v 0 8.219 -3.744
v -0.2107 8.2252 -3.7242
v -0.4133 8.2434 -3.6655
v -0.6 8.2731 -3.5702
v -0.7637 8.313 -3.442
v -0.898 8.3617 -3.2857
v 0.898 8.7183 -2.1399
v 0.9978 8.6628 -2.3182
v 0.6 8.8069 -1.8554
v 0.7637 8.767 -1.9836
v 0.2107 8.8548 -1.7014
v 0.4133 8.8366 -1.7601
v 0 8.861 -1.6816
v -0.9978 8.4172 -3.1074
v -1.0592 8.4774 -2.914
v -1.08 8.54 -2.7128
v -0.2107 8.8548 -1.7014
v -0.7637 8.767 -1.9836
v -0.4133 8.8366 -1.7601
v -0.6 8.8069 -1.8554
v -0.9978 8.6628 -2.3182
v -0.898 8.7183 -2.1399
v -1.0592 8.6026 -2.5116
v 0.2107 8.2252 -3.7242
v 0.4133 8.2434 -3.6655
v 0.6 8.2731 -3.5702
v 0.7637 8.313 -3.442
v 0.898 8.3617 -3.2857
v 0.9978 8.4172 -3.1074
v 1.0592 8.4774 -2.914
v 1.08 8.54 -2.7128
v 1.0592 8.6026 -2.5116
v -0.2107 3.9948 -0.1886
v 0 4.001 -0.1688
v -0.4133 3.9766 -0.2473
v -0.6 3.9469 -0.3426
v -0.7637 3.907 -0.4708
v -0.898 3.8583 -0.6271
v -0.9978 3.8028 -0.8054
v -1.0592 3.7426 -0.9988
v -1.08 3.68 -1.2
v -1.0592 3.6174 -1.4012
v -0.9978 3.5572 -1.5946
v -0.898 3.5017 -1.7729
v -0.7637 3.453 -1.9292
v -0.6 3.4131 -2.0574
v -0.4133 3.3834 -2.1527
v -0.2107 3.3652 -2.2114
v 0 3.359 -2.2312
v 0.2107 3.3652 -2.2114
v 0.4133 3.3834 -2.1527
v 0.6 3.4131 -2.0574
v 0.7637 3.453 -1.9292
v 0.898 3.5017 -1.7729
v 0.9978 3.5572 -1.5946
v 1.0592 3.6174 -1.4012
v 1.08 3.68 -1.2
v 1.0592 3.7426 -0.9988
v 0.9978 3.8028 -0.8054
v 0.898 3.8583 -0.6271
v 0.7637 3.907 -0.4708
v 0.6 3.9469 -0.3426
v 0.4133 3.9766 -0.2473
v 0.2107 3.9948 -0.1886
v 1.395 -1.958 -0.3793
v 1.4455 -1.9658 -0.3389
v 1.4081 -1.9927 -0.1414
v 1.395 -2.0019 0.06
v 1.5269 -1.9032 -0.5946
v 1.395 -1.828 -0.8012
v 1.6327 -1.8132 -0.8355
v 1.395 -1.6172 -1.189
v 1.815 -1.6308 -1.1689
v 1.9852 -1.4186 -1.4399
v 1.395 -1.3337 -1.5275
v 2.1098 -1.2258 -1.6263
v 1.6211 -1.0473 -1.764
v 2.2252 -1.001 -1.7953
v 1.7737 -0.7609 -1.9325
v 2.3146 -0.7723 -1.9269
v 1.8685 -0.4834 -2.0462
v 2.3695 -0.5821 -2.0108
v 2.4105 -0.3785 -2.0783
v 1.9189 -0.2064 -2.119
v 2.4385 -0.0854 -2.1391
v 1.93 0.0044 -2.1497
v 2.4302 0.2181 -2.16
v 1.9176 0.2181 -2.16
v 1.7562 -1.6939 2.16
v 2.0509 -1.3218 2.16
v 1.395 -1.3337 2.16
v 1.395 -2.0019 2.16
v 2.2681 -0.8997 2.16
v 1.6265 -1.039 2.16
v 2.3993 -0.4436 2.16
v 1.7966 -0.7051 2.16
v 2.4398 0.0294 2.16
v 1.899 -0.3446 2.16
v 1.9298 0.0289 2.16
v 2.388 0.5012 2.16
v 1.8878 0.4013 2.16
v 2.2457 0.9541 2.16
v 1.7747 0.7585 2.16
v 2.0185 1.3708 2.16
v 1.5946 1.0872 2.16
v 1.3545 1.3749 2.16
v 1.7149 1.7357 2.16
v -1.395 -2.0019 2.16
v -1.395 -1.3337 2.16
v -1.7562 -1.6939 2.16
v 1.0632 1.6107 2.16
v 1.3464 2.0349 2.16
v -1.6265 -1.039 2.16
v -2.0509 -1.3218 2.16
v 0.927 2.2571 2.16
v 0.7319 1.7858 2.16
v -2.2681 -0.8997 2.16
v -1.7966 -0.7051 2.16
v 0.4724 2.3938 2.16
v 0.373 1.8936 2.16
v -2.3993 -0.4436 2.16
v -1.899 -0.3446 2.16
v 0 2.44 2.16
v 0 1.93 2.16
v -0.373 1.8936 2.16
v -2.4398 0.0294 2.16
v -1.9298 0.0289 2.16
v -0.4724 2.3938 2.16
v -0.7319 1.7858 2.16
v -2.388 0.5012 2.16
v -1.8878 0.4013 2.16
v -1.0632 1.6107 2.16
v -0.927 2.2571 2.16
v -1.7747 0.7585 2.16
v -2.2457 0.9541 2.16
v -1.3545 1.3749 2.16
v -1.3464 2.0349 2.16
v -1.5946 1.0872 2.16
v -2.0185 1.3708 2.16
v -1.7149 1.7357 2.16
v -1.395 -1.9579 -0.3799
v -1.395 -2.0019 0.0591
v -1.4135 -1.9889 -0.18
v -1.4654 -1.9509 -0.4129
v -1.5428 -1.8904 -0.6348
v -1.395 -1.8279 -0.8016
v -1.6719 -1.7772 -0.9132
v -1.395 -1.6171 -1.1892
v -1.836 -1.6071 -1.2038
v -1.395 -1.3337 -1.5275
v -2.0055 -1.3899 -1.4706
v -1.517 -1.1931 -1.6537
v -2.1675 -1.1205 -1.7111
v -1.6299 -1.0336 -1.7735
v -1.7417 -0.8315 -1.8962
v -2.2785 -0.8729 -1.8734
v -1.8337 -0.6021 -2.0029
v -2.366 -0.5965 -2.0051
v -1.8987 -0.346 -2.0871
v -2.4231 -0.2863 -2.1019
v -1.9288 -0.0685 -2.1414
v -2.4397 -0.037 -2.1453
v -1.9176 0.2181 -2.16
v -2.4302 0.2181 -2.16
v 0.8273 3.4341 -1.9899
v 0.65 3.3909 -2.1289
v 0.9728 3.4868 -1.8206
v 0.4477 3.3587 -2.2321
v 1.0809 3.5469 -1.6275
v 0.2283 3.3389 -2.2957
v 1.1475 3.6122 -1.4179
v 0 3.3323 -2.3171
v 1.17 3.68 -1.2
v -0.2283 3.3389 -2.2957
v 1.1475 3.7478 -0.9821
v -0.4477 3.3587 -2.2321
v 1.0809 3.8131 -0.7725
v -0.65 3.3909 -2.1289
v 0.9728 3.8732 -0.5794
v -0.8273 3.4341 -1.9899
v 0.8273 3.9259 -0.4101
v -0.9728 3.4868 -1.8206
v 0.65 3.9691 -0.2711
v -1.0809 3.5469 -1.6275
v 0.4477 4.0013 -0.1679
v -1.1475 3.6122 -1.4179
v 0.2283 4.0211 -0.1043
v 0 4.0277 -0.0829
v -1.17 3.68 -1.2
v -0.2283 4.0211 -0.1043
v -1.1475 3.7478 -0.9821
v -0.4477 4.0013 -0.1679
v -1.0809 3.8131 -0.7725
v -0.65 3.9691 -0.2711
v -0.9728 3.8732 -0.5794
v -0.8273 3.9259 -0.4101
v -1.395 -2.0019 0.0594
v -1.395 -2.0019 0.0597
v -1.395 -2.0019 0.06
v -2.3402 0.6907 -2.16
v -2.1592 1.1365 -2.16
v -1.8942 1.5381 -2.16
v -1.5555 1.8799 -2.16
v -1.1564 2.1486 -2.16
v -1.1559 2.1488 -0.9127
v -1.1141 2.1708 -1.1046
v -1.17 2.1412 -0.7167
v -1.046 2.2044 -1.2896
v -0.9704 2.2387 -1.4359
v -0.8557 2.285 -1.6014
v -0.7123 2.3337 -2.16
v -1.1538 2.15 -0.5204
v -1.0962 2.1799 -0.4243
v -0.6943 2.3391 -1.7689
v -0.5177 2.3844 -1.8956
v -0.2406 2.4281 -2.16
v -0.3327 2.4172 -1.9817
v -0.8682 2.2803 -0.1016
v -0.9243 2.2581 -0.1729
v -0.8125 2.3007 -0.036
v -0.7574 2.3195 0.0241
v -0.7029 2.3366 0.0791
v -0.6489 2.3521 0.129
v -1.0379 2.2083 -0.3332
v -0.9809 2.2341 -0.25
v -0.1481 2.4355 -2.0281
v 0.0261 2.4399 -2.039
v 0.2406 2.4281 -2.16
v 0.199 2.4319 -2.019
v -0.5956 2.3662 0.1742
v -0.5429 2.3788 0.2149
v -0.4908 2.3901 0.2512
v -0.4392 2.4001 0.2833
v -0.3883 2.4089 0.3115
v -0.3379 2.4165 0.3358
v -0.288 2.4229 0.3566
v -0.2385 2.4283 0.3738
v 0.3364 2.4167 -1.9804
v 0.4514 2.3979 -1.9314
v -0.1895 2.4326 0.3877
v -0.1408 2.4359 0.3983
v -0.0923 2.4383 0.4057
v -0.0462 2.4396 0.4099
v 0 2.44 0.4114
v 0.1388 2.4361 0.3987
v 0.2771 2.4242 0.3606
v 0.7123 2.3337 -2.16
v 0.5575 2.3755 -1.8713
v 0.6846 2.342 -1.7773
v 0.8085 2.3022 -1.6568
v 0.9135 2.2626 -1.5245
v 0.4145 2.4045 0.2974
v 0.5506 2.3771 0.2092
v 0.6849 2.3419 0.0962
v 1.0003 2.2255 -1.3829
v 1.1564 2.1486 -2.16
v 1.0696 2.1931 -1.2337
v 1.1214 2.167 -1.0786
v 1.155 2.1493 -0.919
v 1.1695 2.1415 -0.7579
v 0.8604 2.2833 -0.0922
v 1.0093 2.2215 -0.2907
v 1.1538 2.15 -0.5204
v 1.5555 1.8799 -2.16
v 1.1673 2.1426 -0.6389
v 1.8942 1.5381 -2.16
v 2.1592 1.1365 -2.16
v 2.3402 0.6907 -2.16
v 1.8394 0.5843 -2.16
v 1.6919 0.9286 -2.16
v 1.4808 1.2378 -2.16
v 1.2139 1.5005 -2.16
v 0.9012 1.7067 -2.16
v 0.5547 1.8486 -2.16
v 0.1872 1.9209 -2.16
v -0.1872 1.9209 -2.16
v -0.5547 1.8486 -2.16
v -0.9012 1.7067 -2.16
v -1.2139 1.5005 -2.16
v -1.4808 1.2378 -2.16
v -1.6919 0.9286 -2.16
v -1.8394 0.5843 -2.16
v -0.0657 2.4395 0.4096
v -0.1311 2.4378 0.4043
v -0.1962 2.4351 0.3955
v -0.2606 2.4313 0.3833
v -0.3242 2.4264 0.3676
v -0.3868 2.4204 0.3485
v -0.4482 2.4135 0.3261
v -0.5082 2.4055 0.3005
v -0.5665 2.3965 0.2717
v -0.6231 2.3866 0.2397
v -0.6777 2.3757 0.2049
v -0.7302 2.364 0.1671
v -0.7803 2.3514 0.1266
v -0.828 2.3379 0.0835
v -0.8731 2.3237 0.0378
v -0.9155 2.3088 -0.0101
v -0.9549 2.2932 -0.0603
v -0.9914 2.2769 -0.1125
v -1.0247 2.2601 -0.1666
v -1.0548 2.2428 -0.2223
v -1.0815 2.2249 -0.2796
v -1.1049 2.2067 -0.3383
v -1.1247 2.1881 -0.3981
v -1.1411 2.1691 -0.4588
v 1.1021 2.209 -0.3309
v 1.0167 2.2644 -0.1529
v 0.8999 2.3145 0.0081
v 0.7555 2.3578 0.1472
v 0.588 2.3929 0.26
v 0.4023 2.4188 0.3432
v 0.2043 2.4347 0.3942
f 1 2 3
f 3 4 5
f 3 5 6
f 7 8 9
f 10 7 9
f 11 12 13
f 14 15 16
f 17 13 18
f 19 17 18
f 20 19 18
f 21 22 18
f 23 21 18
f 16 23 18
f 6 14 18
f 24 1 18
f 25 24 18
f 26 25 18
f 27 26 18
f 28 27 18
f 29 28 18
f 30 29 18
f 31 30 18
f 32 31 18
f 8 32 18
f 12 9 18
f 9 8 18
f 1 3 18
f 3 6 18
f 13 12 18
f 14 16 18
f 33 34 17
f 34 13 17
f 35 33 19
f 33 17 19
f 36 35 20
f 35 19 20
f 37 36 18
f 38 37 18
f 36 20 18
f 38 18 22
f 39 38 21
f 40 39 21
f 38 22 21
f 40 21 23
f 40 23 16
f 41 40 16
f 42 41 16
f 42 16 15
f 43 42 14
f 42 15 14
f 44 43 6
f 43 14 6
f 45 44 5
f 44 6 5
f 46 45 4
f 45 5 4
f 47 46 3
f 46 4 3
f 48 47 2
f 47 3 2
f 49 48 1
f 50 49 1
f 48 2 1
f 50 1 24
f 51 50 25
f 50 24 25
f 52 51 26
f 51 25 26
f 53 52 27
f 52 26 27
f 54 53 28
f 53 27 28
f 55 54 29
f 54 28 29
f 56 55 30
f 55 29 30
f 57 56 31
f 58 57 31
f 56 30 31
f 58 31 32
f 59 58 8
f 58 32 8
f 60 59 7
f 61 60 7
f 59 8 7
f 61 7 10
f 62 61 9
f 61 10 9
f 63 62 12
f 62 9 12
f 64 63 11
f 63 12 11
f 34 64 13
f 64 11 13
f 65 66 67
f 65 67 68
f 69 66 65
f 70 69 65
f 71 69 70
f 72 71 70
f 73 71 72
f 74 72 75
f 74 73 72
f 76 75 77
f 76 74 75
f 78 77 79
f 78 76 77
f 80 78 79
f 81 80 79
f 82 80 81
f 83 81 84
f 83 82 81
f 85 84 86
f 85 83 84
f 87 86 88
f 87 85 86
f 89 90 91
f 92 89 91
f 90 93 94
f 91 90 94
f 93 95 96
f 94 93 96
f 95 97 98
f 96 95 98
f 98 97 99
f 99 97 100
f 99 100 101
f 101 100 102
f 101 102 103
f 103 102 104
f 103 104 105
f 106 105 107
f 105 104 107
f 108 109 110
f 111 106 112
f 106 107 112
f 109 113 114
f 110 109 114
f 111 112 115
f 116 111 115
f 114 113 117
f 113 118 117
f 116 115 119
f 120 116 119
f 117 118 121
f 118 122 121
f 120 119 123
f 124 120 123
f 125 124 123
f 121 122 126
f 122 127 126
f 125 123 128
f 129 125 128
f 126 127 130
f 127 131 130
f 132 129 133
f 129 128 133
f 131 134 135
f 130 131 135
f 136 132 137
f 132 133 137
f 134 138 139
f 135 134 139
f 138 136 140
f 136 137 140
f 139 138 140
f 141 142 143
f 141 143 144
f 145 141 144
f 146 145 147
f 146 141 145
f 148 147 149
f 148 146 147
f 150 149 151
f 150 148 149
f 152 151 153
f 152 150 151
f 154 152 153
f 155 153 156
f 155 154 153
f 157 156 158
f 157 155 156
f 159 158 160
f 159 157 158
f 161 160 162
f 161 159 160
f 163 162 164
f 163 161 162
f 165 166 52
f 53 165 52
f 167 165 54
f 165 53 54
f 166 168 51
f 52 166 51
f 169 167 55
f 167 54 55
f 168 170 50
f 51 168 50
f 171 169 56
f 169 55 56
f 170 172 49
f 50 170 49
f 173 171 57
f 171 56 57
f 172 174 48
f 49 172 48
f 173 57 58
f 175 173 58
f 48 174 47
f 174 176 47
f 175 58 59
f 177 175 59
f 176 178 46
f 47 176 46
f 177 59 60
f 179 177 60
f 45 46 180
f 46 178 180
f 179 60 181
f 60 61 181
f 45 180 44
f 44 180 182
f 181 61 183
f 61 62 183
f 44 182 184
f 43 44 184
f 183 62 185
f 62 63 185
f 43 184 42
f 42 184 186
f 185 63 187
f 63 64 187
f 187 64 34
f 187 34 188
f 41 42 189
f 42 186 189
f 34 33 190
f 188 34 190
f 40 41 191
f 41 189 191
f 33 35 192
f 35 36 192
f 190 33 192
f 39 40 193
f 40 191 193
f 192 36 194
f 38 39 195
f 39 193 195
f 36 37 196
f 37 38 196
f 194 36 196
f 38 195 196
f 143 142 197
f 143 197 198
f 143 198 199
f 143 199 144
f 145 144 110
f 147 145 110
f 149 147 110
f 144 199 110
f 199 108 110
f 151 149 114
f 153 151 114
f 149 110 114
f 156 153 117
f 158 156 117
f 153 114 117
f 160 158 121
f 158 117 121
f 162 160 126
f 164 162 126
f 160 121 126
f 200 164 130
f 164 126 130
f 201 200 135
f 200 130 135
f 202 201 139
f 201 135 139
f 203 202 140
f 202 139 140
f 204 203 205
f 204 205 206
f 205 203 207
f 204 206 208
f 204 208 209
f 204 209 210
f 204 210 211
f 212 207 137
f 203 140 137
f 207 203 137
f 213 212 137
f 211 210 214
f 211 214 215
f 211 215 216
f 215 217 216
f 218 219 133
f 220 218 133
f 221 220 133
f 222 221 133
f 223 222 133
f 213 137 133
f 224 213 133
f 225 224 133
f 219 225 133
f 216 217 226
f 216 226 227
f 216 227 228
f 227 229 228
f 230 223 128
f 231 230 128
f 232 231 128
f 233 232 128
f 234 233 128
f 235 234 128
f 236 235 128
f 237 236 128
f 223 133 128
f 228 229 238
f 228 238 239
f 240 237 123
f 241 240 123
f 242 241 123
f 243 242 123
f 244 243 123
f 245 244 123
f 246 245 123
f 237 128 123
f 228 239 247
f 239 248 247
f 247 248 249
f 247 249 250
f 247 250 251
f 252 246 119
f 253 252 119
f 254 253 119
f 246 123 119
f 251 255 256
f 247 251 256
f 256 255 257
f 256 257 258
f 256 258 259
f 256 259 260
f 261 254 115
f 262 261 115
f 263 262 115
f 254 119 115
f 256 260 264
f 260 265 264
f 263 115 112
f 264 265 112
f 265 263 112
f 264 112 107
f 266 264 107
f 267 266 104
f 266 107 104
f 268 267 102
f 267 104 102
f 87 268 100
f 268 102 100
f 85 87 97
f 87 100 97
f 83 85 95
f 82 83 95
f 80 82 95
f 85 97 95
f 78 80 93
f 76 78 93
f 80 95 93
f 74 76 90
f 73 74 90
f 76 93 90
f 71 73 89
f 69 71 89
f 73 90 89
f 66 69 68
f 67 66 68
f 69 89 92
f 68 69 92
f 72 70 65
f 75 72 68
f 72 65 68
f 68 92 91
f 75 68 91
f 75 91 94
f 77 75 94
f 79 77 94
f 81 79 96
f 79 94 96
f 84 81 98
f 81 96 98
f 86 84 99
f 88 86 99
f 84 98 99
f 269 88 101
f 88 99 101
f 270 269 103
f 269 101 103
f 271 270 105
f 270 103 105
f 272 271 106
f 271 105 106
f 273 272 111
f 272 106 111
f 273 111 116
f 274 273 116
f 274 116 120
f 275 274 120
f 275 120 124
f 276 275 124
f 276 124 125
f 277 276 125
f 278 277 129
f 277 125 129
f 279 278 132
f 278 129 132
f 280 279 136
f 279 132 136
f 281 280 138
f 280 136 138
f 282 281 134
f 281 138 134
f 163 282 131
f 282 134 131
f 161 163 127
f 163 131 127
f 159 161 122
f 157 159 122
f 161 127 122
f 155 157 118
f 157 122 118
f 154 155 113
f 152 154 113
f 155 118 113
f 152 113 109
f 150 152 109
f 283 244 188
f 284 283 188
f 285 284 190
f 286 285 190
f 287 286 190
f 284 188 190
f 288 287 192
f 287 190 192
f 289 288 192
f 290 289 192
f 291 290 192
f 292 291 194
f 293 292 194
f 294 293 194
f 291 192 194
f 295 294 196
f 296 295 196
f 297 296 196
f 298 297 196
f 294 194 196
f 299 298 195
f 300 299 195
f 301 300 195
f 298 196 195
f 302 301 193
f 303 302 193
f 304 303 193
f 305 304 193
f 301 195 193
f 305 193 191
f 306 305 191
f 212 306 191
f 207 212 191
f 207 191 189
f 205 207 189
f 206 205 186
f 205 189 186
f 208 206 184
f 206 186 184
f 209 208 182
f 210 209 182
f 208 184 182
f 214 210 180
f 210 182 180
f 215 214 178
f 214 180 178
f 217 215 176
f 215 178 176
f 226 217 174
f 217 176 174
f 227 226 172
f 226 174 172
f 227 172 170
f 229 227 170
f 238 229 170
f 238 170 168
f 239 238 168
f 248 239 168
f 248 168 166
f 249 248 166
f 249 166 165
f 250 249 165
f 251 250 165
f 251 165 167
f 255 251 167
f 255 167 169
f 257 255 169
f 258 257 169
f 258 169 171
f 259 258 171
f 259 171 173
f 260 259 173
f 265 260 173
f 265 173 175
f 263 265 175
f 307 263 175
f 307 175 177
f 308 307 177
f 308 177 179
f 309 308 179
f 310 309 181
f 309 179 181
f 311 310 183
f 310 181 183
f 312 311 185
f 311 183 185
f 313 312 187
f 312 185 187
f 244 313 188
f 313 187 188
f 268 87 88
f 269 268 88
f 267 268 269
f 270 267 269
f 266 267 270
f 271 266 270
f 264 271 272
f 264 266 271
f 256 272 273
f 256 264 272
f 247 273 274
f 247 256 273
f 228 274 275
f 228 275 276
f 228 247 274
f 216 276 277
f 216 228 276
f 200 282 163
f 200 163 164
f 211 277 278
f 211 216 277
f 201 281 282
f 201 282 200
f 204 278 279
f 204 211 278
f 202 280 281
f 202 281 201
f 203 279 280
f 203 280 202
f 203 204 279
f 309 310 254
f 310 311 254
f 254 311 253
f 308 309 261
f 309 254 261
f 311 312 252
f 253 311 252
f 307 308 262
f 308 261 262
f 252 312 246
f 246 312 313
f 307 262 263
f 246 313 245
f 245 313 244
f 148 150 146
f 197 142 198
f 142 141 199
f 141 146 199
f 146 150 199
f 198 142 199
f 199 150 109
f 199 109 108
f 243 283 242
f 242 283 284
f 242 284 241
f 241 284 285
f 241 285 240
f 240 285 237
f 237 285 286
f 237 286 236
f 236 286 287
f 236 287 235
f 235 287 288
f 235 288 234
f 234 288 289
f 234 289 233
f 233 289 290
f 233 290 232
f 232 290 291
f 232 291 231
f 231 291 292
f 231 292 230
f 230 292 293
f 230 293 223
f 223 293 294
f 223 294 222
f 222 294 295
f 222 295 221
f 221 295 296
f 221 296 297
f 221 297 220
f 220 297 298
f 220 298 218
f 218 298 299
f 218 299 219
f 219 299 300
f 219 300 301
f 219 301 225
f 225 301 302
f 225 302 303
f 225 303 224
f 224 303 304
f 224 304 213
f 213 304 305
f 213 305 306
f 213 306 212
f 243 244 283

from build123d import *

# Parameters (mm, degrees)
EXTRUDE_2_DEPTH     = 2.16
CUT_EXTRUDE_1_DEPTH = 2.5
CUT_EXTRUDE_2_REACH = 5.744
SKETCH_4_R          = 1.93


with BuildPart() as part:
    # 스케치1 → 보스-돌출2 (new body, symmetric)
    with BuildSketch(Plane.XY):
        with BuildLine():
            Line((-1.395, -1.333744728), (-1.395, -2.001892854))
            ThreePointArc((-1.395, -2.001892854), (0, 2.44), (1.395, -2.001892854))
            Line((1.395, -2.001892854), (1.395, -1.333744728))
            ThreePointArc((1.395, -1.333744728), (0, 1.93), (-1.395, -1.333744728))
        make_face()
    extrude(amount=EXTRUDE_2_DEPTH, both=True)

    # 스케치2 → 컷-돌출1 (cut, symmetric)
    with BuildSketch(Plane(origin=(0, 0, 0), x_dir=(0, 0, -1), z_dir=(1, 0, 0))):
        with BuildLine():
            Line((2.16, -2.001892854), (-0.06, -2.001892854))
            ThreePointArc((-0.06, -2.001892854), (1.509777054, -1.351669909), (2.16, 0.218107146))
            Line((2.16, 0.218107146), (2.16, -2.001892854))
        make_face()
    extrude(amount=CUT_EXTRUDE_1_DEPTH, both=True, mode=Mode.SUBTRACT)

    # 스케치3 → 회전1 (revolve)
    with BuildSketch(Plane(origin=(0, 0, 0), x_dir=(0, 0, -1), z_dir=(1, 0, 0))):
        Polygon((2.712790969, 8.54), (0.705780021, 2.092266368), (-0.411350823, 2.44), (0.082869157, 4.027733632), (0.168802298, 4.000984891), (1.681593267, 8.860984891), align=None)
    revolve(axis=Axis((0, 8.54, -2.712790969), (0, -0.954812687, 0.297208232)))

    # 스케치4 → 컷-돌출2 (cut, up to next)
    with BuildSketch(Plane.XY, mode=Mode.PRIVATE) as cut_extrude_2_sk1:
        Circle(SKETCH_4_R)
    cut_extrude_2_tool1 = extrude(cut_extrude_2_sk1.sketch, amount=-CUT_EXTRUDE_2_REACH, mode=Mode.PRIVATE) & part.part
    add(cut_extrude_2_tool1.solids().sort_by_distance((0, 0, 0))[0], mode=Mode.SUBTRACT)


solid = part.part
